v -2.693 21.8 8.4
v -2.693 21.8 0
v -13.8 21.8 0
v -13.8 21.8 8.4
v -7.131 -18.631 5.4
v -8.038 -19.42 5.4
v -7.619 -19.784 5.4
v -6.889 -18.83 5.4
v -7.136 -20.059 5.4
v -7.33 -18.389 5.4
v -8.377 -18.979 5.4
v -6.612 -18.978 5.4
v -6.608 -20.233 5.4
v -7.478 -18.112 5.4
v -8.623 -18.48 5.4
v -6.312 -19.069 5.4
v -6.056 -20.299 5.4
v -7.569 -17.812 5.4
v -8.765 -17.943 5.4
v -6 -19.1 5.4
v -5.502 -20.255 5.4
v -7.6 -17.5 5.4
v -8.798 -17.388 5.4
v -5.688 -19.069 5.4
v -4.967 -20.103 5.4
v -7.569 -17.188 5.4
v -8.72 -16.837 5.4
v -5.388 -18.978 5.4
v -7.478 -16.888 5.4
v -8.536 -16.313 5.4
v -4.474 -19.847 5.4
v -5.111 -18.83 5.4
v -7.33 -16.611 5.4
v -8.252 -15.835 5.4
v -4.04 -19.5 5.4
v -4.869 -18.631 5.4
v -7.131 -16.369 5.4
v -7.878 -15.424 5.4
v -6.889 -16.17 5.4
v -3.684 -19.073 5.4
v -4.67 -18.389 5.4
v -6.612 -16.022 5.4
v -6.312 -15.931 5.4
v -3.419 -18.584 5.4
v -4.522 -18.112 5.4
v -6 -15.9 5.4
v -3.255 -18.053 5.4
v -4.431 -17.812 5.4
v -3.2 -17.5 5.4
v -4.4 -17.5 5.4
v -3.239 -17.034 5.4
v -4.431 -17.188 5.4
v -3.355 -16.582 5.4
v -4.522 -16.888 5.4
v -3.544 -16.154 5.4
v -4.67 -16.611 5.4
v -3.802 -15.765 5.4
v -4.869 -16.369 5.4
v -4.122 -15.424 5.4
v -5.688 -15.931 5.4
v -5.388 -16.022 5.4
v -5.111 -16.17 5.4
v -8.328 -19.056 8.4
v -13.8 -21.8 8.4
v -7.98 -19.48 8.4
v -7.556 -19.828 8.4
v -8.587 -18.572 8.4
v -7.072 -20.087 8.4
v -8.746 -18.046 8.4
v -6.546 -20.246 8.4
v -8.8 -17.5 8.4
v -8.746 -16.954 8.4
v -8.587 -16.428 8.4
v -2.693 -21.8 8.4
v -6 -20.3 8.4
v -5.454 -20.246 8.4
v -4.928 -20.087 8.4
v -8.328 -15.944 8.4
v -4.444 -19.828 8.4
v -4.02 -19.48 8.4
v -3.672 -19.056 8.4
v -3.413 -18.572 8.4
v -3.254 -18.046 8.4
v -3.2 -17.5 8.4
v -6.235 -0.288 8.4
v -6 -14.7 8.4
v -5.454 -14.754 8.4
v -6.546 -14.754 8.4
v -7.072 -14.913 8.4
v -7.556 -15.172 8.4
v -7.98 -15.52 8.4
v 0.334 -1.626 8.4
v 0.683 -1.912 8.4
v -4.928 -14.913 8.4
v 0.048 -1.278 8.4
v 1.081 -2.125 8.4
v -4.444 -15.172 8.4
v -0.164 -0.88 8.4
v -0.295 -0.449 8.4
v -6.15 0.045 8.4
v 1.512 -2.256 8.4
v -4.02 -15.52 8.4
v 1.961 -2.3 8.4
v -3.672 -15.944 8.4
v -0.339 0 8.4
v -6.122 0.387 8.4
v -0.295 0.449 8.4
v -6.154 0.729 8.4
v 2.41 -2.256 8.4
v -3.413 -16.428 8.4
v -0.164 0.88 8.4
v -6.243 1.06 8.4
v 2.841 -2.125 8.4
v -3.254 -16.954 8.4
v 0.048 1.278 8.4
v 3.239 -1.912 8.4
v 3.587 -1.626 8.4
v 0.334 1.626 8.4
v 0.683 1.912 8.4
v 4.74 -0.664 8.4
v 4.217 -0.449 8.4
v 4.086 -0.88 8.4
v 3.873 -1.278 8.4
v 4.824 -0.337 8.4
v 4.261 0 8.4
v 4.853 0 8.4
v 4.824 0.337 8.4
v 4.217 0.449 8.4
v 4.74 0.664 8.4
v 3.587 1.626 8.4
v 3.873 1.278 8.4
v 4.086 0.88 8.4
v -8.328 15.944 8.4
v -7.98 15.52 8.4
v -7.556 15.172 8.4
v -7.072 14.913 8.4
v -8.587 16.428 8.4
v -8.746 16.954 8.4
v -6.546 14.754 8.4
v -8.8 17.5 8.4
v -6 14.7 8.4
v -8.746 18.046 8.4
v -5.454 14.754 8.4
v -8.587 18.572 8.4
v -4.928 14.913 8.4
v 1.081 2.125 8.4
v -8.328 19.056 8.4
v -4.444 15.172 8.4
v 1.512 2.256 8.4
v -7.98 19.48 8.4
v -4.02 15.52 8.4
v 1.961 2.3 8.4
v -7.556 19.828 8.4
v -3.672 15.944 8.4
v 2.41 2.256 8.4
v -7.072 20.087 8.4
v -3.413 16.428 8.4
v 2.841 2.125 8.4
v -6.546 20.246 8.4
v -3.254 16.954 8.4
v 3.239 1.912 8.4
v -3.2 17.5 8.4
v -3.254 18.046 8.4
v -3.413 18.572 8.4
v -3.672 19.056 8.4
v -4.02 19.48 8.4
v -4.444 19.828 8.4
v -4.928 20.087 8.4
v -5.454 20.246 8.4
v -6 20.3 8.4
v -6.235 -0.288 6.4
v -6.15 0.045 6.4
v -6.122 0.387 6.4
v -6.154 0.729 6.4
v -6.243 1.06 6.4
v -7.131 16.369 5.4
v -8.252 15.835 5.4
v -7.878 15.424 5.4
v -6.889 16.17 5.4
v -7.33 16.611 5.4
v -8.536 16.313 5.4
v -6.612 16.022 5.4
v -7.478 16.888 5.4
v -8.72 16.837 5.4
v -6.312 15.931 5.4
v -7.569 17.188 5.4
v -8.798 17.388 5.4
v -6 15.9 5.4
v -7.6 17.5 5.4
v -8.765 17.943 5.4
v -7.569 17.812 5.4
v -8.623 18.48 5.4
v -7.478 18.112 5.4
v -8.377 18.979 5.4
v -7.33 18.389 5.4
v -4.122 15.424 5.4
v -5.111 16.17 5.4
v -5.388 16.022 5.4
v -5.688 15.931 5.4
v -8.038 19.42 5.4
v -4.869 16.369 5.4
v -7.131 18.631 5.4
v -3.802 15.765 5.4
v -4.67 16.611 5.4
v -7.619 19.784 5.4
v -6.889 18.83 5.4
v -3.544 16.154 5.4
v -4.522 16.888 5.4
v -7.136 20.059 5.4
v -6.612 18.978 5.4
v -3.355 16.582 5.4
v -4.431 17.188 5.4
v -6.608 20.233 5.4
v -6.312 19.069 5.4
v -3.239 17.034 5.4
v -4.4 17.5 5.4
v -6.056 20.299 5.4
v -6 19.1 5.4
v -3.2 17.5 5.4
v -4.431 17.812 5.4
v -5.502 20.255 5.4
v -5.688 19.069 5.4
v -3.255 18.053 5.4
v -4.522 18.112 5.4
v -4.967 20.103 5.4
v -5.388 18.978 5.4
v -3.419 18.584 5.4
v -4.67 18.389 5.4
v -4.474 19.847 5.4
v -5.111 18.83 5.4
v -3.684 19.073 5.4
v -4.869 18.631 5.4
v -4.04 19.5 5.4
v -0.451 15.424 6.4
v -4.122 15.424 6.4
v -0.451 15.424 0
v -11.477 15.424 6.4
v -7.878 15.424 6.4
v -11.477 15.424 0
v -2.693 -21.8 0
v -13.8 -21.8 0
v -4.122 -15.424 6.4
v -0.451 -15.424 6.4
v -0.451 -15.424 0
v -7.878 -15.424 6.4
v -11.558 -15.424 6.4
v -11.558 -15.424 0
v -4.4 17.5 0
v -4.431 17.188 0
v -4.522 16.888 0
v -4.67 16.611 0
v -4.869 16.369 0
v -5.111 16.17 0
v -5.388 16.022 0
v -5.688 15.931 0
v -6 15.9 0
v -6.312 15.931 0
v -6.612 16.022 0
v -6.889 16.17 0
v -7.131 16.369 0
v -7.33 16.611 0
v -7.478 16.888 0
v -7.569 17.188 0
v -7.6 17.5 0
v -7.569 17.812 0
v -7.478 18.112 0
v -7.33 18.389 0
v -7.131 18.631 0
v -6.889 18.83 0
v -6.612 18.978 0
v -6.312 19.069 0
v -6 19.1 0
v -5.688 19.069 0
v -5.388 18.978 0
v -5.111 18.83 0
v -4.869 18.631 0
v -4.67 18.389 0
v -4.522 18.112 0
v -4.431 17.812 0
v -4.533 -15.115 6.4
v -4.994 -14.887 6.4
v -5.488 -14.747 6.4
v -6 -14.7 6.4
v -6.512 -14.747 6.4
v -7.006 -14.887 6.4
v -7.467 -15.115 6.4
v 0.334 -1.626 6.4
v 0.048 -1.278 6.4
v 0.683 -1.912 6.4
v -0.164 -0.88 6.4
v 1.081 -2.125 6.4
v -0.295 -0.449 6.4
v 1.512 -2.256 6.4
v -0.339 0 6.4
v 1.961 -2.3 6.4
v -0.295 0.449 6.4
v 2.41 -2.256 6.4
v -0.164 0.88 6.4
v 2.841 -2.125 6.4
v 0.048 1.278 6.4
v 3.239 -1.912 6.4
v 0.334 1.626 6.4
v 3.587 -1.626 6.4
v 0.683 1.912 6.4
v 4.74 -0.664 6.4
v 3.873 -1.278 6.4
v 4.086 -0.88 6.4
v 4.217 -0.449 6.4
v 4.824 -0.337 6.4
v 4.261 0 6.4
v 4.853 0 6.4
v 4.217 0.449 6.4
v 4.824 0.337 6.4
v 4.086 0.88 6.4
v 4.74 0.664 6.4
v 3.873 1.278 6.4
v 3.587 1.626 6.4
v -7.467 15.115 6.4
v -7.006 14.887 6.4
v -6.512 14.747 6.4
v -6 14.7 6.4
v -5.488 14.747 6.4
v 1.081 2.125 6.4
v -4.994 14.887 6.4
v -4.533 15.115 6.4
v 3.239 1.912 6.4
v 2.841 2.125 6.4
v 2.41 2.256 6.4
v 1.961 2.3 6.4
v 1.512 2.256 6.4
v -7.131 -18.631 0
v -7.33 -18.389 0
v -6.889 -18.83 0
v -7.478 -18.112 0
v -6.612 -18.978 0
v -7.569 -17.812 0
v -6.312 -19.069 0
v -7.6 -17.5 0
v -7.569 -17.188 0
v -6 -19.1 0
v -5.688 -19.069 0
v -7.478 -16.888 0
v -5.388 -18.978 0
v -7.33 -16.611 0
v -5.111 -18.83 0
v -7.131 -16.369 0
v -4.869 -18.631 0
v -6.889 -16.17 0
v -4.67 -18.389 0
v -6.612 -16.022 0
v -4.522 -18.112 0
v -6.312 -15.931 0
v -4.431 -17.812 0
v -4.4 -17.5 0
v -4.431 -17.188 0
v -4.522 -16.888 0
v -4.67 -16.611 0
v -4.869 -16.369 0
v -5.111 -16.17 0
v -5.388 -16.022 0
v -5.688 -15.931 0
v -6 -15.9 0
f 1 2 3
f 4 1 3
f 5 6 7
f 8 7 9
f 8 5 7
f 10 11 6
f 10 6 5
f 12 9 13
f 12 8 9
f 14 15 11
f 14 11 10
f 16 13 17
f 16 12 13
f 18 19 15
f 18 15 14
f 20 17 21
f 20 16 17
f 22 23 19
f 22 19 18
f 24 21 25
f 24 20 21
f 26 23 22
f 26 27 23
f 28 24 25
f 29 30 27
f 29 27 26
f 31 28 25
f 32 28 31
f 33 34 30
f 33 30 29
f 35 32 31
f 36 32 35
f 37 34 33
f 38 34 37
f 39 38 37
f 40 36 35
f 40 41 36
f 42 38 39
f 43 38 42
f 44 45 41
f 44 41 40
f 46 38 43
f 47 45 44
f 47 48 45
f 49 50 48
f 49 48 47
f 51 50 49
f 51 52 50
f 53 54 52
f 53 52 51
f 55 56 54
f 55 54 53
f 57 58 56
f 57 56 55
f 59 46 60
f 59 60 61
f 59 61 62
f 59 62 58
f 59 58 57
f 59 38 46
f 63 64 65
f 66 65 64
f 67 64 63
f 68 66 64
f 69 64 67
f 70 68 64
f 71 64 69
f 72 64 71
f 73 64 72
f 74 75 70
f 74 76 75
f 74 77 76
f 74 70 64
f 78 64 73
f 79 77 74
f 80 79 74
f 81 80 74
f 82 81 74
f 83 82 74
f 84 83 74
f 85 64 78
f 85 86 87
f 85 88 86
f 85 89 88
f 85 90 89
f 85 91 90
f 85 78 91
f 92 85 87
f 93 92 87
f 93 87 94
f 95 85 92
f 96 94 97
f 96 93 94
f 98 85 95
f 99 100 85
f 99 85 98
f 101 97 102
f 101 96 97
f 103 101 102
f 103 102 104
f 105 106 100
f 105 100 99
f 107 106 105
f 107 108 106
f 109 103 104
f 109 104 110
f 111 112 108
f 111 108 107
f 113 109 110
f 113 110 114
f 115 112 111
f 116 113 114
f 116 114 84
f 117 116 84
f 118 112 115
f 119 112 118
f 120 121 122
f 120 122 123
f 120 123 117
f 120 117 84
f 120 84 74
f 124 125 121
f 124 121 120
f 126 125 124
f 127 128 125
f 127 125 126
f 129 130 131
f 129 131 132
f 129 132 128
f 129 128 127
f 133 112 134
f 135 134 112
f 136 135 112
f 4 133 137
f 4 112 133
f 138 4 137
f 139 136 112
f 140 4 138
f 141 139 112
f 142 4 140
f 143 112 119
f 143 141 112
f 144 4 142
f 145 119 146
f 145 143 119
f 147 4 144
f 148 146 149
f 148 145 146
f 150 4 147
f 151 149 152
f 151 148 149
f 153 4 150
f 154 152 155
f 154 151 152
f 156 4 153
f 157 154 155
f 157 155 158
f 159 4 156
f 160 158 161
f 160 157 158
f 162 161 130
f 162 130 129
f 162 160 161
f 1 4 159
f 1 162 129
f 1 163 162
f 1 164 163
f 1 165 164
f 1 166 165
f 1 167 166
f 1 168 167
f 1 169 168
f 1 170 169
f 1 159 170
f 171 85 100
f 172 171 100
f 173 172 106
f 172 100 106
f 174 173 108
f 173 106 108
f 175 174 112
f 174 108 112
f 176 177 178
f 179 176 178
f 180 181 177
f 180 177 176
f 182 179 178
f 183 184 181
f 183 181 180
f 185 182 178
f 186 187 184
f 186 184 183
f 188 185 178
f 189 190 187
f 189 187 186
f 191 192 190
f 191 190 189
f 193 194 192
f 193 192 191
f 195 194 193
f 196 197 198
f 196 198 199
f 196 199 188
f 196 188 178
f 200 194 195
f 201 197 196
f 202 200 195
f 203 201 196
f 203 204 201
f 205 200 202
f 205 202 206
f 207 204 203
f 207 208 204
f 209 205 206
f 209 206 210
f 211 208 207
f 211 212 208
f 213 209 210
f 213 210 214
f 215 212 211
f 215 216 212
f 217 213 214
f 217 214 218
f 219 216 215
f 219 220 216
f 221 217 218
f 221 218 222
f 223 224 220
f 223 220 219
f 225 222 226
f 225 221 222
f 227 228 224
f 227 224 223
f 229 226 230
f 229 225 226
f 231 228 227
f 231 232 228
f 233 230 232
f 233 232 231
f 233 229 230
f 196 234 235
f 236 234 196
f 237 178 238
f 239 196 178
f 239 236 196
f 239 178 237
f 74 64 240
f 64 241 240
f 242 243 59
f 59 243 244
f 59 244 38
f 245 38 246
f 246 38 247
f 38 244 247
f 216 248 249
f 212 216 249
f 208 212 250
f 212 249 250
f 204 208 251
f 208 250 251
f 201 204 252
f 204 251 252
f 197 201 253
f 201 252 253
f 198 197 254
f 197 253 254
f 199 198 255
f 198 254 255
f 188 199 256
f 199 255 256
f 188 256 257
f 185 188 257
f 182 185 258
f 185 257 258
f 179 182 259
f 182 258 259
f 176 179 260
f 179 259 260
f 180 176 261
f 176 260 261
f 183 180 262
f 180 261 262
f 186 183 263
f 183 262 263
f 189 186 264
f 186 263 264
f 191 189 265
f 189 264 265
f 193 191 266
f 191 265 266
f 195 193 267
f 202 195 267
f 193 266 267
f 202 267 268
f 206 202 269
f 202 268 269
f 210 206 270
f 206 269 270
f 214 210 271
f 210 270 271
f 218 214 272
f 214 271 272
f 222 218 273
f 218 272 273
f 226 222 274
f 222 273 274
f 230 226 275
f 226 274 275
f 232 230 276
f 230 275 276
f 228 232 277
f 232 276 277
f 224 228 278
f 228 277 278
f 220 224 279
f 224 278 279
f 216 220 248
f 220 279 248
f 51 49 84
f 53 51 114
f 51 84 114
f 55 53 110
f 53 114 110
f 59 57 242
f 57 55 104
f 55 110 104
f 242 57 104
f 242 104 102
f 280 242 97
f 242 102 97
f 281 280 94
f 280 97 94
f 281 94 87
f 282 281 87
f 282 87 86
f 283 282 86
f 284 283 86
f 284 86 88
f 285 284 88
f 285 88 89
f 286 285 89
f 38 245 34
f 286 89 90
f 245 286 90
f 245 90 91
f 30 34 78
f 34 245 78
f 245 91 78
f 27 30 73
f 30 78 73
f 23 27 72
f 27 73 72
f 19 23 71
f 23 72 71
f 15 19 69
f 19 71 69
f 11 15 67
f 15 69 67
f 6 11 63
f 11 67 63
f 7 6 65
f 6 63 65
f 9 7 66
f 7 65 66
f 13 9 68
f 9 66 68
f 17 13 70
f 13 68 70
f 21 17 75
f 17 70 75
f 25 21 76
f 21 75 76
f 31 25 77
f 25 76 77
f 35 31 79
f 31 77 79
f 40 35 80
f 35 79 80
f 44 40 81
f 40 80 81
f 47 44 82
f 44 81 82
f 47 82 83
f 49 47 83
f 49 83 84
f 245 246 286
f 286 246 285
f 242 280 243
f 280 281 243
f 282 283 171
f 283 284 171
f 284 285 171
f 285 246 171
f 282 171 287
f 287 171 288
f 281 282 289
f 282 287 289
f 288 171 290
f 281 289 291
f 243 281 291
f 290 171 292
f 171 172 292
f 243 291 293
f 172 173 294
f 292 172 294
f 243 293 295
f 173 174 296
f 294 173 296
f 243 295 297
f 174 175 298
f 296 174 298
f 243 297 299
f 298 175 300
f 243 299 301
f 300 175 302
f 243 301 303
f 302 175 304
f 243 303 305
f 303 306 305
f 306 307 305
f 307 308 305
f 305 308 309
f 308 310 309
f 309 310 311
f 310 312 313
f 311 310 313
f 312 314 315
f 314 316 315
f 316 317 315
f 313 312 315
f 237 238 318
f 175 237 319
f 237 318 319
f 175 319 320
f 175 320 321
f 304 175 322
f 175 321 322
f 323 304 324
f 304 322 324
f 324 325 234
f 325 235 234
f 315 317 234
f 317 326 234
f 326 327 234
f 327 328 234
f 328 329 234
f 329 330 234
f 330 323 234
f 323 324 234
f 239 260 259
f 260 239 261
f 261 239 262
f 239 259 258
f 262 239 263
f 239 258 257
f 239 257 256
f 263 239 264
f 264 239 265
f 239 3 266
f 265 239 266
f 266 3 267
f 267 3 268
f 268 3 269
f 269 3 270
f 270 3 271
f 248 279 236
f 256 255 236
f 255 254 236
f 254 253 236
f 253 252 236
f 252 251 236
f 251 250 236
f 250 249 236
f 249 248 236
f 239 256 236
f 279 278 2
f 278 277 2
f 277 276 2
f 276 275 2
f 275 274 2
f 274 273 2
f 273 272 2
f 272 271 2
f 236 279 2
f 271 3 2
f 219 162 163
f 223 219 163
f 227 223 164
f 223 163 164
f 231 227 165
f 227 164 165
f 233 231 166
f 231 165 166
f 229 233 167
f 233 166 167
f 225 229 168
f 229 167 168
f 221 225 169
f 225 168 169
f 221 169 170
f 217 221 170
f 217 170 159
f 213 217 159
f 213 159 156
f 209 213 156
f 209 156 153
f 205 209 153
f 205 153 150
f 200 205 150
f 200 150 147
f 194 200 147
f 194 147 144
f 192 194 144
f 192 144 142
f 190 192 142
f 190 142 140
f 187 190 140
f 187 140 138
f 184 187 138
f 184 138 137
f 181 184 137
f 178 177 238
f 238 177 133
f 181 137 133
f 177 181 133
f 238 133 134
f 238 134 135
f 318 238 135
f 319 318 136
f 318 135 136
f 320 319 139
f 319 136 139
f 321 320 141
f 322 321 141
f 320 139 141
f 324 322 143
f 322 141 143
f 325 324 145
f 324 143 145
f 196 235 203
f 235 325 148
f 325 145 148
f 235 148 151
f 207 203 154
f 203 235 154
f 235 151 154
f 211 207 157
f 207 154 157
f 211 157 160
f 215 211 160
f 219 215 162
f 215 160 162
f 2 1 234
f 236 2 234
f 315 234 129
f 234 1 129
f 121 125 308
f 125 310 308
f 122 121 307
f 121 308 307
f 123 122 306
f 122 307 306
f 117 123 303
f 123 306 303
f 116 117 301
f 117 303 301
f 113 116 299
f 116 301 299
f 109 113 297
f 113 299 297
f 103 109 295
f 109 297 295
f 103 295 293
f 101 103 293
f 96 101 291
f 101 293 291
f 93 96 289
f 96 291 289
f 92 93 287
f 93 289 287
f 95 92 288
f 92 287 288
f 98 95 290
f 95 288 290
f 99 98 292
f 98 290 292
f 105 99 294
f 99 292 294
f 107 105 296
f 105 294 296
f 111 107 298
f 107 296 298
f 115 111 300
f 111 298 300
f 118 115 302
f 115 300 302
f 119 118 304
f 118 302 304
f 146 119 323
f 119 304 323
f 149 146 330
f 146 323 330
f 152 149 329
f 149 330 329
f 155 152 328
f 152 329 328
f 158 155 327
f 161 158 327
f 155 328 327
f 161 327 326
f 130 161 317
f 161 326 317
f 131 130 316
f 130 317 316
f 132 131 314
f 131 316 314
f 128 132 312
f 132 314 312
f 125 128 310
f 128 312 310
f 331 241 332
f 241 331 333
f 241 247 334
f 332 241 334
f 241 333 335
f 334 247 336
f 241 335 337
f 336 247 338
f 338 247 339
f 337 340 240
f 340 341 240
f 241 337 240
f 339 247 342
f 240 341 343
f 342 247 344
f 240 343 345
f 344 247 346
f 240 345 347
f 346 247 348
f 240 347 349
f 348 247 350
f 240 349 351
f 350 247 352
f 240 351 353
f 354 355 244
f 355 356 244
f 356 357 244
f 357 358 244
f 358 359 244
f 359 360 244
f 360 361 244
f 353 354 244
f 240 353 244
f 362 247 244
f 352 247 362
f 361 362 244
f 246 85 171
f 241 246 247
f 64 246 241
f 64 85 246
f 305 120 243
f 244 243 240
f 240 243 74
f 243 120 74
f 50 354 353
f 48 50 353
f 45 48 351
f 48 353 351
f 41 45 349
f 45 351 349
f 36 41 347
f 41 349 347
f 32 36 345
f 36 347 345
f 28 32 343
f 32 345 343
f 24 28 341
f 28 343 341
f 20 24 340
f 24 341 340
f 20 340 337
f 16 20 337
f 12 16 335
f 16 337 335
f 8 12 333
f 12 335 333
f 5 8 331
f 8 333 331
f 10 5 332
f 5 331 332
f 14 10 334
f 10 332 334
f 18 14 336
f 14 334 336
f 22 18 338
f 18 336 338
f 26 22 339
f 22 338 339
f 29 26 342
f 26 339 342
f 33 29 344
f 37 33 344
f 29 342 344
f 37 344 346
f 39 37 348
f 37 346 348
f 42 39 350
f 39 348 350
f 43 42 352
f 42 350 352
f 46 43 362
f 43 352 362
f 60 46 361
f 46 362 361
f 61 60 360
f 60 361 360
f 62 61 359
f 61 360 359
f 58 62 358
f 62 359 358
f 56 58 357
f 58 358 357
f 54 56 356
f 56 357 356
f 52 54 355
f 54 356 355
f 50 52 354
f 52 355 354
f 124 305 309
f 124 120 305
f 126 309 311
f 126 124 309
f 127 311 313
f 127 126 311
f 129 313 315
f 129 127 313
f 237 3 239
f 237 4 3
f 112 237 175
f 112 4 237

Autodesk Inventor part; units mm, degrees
ref_plane "YZ Plane" through (0, 0, 0) normal (1, 0, 0) x (0, 1, 0)
ref_plane "XZ Plane" through (0, 0, 0) normal (0, 1, 0) x (-1, 0, 0)
ref_plane "XY Plane" through (0, 0, 0) normal (0, 0, 1) x (1, 0, 0)
sketch "Sketch1" plane through (0, 0, 0) normal (0, 0, 1) x (1, 0, 0)
  circle A0 centre (1.9608, 0) radius 2 construction
  circle A1 centre (-6, -17.5) radius 1.5 construction
  circle A2 centre (-6, 17.5) radius 1.5 construction
  line L0 (11.3072, 21.8) -> (-13.8, 21.8) construction
  line L1 (-13.8, 21.8) -> (-13.8, -21.8) construction
  line L2 (-13.8, -21.8) -> (11.3072, -21.8) construction
  line L3 (11.3072, -21.8) -> (11.3072, 21.8) construction
  line L4 (-18.8214, 0) -> (16.3286, 0) construction
  line L5 (-2.5075, 14.4235) -> (-13.8, 14.4235) construction
  circle A3 centre (-6, -17.5) radius 1.5 construction
  line L6 (11.3072, -21.8) -> (-13.8, -21.8) construction
  line L7 (-13.8, -21.8) -> (11.3072, -21.8)
  line L8 (-2.5075, -14.4235) -> (-13.8, -14.4235) construction
  circle A4 centre (-6, 17.5) radius 1.6
  circle A5 centre (-6, -17.5) radius 1.6
  line L9 (-13.8, 21.8) -> (11.3072, 21.8)
  line L10 (11.3072, 21.8) -> (11.3072, 15.4235)
  line L11 (11.3072, 15.4235) -> (-13.8, 15.4235)
  line L12 (-13.8, 15.4235) -> (-13.8, 21.8)
  line L13 (11.3072, 21.8) -> (11.3072, -21.8) construction
  line L14 (-13.8, -21.8) -> (11.3072, -21.8)
  line L15 (11.3072, -21.8) -> (11.3072, -15.4235)
  line L16 (11.3072, -15.4235) -> (-13.8, -15.4235)
  line L17 (-13.8, -15.4235) -> (-13.8, -21.8)
  point P0 (0, 0)
  dimension "d0" = 0.1
  dimension "d1" = 0.1
  dimension "d13" = 1
extrude "Extrusion1" add sketch "Sketch1" along normal blind 6.4
sketch "Sketch2" plane through (0, 0, 6.4) normal (0, 0, 1) x (1, 0, 0)
  circle A0 centre (-6, 17.5) radius 1.6 construction
  circle A1 centre (-6, -17.5) radius 1.6 construction
  line L0 (11.3072, 21.8) -> (-13.8, 21.8) projected
  line L1 (-13.8, -21.8) -> (11.3072, -21.8) projected
  line L2 (-13.8, 21.8) -> (11.3072, 21.8)
  line L3 (11.3072, 21.8) -> (11.3072, -21.8)
  line L4 (11.3072, -21.8) -> (-13.8, -21.8)
  line L5 (-13.8, -21.8) -> (-13.8, 21.8)
  circle A2 centre (-6, -17.5) radius 1.7
  circle A3 centre (-6, 17.5) radius 1.7
  circle A4 centre (1.9608, 0) radius 2 construction
  circle A5 centre (1.9608, 0) radius 2.3
  line L6 (-2.9164, -21.8) -> (3.0965, -2)
  line L7 (3.0965, 2) -> (-2.9164, 21.8)
  line L8 (-13.8, 21.8) -> (11.3072, 21.8) projected
  point P0 (0, 0)
  dimension "d6" = 0.1
  dimension "d7" = 0.1
  dimension "d8" = 0.3
extrude "Extrusion2" add sketch "Sketch2" along normal blind 2 contours L3 L1 L6 A5 L7 L0 | L7 A5 L6 L1 L5 L0
sketch "Sketch3" plane through (0, 0, 8.4) normal (0, 0, 1) x (1, 0, 0)
  circle A0 centre (1.9608, 0) radius 2.3 construction
  circle A1 centre (-6, 17.5) radius 1.7 construction
  circle A2 centre (-6, -17.5) radius 1.7 construction
  line L0 (11.3072, 21.8) -> (-13.8, 21.8) construction
  line L1 (-13.8, 21.8) -> (-13.8, -21.8) construction
  line L2 (-13.8, -21.8) -> (11.3072, -21.8) construction
  line L3 (11.3072, -21.8) -> (11.3072, 21.8) construction
  circle A3 centre (-6, -17.5) radius 2.8
  circle A4 centre (-6, 17.5) radius 2.8
  point P0 (0, 0)
  dimension "d9" = 5.6
  dimension "d10" = 5.6
extrude "Extrusion3" cut sketch "Sketch3" against normal blind 3
sketch "Sketch4" plane through (0, 0, 8.4) normal (0, 0, 1) x (1, 0, 0)
  circle A0 centre (-6, -17.5) radius 2.8 construction
  circle A1 centre (-6, 17.5) radius 2.8 construction
  circle A2 centre (1.9608, 0) radius 2.3 construction
  line L0 (11.3072, 21.8) -> (-13.8, 21.8) construction
  line L1 (-13.8, 21.8) -> (-13.8, -21.8) construction
  line L2 (-13.8, -21.8) -> (11.3072, -21.8) construction
  line L3 (11.3072, -21.8) -> (11.3072, 21.8) projected
  line L4 (11.3072, -21.8) -> (11.3072, 21.8) projected
  line L5 (11.3072, 21.8) -> (-2.6928, 21.8)
  line L6 (-13.8, 21.8) -> (11.3072, 21.8) projected
  line L7 (-2.6928, 21.8) -> (4.7397, 0.6635)
  line L8 (4.7397, -0.6635) -> (-2.6928, -21.8)
  line L9 (-13.8, -21.8) -> (11.3072, -21.8) projected
  line L10 (-2.6928, -21.8) -> (11.3072, -21.8)
  line L11 (11.3072, -21.8) -> (11.3072, 21.8)
  arc A3 (4.7397, -0.6635) -> (4.7397, 0.6635) centre (2.853, 0) ccw
  line L12 (-13.8, 21.8) -> (-6.243, 1.0605)
  line L13 (-6.2354, -0.2877) -> (-13.8, -21.8)
  line L14 (-13.8, 21.8) -> (-13.8, -21.8)
  arc A4 (-6.2354, -0.2877) -> (-6.243, 1.0605) centre (-8.1221, 0.3758) ccw
  point P0 (4.973, 0)
  dimension "d14" = 14
  dimension "d17" = 2
  dimension "d18" = 2
extrude "Extrusion4" cut sketch "Sketch4" against normal through all contours L9 L8 A3 L7 L5 L3 | L14 L12 A4 L13
equation "\"d10\" = d9"
properties part number "20_focus_inlet_plate_top"
